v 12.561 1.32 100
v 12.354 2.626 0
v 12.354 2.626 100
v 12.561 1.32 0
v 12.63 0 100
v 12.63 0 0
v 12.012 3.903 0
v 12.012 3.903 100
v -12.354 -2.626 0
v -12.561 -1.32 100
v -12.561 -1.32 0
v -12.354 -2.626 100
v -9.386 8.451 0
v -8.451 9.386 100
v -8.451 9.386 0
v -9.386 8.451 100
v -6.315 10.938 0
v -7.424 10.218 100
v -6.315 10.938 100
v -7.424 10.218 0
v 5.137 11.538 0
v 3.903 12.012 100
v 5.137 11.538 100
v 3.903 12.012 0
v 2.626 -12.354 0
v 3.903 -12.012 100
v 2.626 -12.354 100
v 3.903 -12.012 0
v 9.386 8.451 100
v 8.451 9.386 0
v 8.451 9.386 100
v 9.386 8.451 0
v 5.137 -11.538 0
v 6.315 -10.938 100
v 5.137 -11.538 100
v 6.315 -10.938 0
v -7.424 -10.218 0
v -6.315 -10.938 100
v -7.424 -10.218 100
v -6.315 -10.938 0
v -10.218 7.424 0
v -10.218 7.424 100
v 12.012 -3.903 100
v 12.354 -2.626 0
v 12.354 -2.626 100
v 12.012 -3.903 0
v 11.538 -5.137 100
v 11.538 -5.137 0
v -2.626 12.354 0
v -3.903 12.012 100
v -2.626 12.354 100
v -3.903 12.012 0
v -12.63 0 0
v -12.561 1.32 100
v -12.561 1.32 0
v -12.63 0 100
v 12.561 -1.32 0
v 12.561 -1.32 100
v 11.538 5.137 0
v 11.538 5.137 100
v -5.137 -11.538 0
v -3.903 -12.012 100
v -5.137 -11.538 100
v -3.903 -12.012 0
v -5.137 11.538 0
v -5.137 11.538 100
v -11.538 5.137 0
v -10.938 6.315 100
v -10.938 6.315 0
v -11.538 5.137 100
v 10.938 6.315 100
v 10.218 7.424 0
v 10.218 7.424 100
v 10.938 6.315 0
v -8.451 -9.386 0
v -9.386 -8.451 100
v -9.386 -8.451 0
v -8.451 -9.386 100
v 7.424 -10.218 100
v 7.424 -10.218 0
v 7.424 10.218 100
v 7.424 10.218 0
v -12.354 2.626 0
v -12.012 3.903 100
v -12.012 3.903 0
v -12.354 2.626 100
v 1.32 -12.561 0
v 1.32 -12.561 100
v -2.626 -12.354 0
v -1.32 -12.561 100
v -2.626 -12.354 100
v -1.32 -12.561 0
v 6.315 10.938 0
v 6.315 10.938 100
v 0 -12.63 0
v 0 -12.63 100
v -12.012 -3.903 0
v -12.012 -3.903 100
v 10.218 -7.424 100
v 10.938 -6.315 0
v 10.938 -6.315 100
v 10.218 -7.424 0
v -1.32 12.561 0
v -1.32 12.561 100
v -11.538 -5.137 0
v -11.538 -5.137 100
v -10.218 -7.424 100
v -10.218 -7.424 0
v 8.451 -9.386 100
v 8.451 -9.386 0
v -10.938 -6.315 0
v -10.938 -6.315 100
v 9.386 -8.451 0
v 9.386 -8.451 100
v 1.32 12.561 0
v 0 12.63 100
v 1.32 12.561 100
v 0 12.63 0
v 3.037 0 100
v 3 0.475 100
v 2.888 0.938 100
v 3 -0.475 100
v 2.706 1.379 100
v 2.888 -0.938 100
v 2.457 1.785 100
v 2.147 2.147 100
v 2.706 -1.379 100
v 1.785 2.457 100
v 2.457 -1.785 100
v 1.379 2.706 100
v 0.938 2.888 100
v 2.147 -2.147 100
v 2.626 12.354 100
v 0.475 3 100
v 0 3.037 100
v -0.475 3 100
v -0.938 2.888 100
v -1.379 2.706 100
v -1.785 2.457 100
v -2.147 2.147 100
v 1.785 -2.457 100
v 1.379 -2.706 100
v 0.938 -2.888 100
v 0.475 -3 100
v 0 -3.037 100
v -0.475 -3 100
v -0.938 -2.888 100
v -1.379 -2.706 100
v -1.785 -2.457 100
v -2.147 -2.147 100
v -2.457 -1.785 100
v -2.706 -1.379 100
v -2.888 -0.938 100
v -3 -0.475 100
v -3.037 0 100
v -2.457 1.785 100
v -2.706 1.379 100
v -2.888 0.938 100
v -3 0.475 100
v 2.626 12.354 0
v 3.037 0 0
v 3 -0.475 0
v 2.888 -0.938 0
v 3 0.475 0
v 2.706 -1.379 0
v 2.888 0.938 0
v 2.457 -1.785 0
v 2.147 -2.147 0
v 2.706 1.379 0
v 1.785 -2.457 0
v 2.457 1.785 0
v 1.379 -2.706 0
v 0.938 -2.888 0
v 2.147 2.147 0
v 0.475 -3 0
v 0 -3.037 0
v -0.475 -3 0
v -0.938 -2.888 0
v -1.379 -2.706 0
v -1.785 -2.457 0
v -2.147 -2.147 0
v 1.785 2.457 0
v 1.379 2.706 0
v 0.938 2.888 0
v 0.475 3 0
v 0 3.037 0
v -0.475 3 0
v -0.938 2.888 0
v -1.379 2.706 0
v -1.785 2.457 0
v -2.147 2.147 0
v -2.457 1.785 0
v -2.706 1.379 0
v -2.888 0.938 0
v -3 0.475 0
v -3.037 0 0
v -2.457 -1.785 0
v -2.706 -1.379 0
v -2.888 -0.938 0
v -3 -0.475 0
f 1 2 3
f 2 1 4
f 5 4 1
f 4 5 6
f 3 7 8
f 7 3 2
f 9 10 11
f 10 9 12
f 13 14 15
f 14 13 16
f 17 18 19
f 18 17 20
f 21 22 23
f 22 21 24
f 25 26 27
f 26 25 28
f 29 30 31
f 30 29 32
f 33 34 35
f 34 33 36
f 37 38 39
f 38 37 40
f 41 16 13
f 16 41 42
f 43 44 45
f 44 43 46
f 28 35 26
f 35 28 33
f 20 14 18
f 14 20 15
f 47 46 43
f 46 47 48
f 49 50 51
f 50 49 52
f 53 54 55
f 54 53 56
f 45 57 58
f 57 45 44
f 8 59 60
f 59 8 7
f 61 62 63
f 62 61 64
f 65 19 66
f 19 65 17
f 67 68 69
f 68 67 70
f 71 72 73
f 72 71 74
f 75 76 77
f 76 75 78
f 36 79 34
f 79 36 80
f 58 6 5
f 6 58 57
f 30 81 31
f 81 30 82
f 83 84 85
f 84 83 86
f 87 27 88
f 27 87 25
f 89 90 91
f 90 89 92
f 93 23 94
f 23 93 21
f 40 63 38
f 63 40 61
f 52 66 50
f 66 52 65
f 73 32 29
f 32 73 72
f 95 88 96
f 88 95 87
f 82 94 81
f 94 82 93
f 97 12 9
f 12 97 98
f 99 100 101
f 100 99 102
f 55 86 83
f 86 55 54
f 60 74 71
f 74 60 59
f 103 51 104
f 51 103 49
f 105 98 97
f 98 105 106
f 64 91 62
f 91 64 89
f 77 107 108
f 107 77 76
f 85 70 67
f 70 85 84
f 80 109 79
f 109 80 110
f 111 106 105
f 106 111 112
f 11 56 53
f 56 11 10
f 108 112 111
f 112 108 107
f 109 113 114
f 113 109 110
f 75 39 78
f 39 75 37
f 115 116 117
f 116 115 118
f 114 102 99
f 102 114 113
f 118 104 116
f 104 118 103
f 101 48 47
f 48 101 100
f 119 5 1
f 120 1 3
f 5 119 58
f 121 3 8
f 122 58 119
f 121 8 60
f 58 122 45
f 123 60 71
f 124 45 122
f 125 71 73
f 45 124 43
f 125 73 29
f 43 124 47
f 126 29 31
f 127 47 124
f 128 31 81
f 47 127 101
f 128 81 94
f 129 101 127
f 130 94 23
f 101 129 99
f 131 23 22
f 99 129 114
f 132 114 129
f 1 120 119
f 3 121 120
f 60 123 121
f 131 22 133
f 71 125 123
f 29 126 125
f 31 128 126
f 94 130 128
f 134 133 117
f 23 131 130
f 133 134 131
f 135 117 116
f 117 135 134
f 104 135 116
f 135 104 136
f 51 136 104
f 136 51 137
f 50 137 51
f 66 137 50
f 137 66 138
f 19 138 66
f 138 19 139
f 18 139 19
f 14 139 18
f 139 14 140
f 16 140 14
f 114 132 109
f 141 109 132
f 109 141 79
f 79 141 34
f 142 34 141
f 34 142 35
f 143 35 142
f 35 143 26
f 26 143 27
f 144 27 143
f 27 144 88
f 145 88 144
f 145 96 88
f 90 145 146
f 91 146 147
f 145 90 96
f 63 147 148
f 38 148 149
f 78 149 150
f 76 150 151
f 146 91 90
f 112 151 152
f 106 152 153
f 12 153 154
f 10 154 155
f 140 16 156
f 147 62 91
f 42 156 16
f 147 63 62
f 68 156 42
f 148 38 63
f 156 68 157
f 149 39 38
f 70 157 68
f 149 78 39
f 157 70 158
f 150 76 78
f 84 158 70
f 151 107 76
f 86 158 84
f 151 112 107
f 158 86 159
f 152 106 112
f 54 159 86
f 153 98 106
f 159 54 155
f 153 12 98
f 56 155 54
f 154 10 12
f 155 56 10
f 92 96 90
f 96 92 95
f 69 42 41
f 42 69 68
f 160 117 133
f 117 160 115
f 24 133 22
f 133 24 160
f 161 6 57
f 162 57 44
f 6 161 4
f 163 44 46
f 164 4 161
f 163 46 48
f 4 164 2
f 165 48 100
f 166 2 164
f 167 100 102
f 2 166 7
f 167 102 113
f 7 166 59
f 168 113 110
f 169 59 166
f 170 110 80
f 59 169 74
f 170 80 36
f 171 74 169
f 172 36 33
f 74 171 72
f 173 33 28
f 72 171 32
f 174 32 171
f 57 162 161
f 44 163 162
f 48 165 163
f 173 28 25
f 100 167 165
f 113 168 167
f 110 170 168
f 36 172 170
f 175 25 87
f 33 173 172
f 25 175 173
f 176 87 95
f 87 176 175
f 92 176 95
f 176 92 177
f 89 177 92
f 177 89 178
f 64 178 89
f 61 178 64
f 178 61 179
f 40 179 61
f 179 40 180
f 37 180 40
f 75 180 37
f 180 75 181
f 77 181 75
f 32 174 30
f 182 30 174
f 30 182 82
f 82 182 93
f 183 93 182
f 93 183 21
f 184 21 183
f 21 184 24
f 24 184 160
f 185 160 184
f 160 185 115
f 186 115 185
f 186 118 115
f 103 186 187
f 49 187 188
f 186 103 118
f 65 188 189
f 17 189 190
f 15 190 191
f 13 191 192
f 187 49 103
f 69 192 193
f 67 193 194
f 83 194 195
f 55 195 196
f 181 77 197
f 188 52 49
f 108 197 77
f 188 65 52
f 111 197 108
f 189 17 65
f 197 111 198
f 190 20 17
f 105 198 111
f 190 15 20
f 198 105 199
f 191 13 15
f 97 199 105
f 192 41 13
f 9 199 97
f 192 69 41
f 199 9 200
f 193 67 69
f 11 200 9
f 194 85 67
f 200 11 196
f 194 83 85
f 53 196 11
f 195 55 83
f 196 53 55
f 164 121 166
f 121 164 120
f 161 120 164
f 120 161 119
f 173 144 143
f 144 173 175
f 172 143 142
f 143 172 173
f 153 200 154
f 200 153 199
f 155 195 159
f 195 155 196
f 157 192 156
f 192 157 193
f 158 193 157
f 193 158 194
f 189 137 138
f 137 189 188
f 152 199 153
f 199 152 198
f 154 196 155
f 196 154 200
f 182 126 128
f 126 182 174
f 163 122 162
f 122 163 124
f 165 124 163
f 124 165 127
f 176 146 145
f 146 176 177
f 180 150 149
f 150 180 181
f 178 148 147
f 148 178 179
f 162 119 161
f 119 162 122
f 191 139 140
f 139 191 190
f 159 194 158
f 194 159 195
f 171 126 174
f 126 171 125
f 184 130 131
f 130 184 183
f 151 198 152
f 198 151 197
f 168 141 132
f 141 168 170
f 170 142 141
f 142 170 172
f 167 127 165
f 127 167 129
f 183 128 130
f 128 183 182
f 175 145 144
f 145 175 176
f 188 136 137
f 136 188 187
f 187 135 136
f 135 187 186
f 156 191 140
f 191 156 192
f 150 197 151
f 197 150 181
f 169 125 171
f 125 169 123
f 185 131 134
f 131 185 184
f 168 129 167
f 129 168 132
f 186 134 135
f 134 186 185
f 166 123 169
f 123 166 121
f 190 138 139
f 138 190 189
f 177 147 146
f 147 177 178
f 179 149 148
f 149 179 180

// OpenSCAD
        wall_thickness = 2.78;
        bore_clearance = 1.037;
        roller_radius = 12.63;

        module roller() {
            difference() {
                cylinder(h=100, r=roller_radius, $fn=60);
                translate([0,0,-5])
                    cylinder(h=110, r=bore_clearance + 2, $fn=40);
            }
        }
        roller();
        
